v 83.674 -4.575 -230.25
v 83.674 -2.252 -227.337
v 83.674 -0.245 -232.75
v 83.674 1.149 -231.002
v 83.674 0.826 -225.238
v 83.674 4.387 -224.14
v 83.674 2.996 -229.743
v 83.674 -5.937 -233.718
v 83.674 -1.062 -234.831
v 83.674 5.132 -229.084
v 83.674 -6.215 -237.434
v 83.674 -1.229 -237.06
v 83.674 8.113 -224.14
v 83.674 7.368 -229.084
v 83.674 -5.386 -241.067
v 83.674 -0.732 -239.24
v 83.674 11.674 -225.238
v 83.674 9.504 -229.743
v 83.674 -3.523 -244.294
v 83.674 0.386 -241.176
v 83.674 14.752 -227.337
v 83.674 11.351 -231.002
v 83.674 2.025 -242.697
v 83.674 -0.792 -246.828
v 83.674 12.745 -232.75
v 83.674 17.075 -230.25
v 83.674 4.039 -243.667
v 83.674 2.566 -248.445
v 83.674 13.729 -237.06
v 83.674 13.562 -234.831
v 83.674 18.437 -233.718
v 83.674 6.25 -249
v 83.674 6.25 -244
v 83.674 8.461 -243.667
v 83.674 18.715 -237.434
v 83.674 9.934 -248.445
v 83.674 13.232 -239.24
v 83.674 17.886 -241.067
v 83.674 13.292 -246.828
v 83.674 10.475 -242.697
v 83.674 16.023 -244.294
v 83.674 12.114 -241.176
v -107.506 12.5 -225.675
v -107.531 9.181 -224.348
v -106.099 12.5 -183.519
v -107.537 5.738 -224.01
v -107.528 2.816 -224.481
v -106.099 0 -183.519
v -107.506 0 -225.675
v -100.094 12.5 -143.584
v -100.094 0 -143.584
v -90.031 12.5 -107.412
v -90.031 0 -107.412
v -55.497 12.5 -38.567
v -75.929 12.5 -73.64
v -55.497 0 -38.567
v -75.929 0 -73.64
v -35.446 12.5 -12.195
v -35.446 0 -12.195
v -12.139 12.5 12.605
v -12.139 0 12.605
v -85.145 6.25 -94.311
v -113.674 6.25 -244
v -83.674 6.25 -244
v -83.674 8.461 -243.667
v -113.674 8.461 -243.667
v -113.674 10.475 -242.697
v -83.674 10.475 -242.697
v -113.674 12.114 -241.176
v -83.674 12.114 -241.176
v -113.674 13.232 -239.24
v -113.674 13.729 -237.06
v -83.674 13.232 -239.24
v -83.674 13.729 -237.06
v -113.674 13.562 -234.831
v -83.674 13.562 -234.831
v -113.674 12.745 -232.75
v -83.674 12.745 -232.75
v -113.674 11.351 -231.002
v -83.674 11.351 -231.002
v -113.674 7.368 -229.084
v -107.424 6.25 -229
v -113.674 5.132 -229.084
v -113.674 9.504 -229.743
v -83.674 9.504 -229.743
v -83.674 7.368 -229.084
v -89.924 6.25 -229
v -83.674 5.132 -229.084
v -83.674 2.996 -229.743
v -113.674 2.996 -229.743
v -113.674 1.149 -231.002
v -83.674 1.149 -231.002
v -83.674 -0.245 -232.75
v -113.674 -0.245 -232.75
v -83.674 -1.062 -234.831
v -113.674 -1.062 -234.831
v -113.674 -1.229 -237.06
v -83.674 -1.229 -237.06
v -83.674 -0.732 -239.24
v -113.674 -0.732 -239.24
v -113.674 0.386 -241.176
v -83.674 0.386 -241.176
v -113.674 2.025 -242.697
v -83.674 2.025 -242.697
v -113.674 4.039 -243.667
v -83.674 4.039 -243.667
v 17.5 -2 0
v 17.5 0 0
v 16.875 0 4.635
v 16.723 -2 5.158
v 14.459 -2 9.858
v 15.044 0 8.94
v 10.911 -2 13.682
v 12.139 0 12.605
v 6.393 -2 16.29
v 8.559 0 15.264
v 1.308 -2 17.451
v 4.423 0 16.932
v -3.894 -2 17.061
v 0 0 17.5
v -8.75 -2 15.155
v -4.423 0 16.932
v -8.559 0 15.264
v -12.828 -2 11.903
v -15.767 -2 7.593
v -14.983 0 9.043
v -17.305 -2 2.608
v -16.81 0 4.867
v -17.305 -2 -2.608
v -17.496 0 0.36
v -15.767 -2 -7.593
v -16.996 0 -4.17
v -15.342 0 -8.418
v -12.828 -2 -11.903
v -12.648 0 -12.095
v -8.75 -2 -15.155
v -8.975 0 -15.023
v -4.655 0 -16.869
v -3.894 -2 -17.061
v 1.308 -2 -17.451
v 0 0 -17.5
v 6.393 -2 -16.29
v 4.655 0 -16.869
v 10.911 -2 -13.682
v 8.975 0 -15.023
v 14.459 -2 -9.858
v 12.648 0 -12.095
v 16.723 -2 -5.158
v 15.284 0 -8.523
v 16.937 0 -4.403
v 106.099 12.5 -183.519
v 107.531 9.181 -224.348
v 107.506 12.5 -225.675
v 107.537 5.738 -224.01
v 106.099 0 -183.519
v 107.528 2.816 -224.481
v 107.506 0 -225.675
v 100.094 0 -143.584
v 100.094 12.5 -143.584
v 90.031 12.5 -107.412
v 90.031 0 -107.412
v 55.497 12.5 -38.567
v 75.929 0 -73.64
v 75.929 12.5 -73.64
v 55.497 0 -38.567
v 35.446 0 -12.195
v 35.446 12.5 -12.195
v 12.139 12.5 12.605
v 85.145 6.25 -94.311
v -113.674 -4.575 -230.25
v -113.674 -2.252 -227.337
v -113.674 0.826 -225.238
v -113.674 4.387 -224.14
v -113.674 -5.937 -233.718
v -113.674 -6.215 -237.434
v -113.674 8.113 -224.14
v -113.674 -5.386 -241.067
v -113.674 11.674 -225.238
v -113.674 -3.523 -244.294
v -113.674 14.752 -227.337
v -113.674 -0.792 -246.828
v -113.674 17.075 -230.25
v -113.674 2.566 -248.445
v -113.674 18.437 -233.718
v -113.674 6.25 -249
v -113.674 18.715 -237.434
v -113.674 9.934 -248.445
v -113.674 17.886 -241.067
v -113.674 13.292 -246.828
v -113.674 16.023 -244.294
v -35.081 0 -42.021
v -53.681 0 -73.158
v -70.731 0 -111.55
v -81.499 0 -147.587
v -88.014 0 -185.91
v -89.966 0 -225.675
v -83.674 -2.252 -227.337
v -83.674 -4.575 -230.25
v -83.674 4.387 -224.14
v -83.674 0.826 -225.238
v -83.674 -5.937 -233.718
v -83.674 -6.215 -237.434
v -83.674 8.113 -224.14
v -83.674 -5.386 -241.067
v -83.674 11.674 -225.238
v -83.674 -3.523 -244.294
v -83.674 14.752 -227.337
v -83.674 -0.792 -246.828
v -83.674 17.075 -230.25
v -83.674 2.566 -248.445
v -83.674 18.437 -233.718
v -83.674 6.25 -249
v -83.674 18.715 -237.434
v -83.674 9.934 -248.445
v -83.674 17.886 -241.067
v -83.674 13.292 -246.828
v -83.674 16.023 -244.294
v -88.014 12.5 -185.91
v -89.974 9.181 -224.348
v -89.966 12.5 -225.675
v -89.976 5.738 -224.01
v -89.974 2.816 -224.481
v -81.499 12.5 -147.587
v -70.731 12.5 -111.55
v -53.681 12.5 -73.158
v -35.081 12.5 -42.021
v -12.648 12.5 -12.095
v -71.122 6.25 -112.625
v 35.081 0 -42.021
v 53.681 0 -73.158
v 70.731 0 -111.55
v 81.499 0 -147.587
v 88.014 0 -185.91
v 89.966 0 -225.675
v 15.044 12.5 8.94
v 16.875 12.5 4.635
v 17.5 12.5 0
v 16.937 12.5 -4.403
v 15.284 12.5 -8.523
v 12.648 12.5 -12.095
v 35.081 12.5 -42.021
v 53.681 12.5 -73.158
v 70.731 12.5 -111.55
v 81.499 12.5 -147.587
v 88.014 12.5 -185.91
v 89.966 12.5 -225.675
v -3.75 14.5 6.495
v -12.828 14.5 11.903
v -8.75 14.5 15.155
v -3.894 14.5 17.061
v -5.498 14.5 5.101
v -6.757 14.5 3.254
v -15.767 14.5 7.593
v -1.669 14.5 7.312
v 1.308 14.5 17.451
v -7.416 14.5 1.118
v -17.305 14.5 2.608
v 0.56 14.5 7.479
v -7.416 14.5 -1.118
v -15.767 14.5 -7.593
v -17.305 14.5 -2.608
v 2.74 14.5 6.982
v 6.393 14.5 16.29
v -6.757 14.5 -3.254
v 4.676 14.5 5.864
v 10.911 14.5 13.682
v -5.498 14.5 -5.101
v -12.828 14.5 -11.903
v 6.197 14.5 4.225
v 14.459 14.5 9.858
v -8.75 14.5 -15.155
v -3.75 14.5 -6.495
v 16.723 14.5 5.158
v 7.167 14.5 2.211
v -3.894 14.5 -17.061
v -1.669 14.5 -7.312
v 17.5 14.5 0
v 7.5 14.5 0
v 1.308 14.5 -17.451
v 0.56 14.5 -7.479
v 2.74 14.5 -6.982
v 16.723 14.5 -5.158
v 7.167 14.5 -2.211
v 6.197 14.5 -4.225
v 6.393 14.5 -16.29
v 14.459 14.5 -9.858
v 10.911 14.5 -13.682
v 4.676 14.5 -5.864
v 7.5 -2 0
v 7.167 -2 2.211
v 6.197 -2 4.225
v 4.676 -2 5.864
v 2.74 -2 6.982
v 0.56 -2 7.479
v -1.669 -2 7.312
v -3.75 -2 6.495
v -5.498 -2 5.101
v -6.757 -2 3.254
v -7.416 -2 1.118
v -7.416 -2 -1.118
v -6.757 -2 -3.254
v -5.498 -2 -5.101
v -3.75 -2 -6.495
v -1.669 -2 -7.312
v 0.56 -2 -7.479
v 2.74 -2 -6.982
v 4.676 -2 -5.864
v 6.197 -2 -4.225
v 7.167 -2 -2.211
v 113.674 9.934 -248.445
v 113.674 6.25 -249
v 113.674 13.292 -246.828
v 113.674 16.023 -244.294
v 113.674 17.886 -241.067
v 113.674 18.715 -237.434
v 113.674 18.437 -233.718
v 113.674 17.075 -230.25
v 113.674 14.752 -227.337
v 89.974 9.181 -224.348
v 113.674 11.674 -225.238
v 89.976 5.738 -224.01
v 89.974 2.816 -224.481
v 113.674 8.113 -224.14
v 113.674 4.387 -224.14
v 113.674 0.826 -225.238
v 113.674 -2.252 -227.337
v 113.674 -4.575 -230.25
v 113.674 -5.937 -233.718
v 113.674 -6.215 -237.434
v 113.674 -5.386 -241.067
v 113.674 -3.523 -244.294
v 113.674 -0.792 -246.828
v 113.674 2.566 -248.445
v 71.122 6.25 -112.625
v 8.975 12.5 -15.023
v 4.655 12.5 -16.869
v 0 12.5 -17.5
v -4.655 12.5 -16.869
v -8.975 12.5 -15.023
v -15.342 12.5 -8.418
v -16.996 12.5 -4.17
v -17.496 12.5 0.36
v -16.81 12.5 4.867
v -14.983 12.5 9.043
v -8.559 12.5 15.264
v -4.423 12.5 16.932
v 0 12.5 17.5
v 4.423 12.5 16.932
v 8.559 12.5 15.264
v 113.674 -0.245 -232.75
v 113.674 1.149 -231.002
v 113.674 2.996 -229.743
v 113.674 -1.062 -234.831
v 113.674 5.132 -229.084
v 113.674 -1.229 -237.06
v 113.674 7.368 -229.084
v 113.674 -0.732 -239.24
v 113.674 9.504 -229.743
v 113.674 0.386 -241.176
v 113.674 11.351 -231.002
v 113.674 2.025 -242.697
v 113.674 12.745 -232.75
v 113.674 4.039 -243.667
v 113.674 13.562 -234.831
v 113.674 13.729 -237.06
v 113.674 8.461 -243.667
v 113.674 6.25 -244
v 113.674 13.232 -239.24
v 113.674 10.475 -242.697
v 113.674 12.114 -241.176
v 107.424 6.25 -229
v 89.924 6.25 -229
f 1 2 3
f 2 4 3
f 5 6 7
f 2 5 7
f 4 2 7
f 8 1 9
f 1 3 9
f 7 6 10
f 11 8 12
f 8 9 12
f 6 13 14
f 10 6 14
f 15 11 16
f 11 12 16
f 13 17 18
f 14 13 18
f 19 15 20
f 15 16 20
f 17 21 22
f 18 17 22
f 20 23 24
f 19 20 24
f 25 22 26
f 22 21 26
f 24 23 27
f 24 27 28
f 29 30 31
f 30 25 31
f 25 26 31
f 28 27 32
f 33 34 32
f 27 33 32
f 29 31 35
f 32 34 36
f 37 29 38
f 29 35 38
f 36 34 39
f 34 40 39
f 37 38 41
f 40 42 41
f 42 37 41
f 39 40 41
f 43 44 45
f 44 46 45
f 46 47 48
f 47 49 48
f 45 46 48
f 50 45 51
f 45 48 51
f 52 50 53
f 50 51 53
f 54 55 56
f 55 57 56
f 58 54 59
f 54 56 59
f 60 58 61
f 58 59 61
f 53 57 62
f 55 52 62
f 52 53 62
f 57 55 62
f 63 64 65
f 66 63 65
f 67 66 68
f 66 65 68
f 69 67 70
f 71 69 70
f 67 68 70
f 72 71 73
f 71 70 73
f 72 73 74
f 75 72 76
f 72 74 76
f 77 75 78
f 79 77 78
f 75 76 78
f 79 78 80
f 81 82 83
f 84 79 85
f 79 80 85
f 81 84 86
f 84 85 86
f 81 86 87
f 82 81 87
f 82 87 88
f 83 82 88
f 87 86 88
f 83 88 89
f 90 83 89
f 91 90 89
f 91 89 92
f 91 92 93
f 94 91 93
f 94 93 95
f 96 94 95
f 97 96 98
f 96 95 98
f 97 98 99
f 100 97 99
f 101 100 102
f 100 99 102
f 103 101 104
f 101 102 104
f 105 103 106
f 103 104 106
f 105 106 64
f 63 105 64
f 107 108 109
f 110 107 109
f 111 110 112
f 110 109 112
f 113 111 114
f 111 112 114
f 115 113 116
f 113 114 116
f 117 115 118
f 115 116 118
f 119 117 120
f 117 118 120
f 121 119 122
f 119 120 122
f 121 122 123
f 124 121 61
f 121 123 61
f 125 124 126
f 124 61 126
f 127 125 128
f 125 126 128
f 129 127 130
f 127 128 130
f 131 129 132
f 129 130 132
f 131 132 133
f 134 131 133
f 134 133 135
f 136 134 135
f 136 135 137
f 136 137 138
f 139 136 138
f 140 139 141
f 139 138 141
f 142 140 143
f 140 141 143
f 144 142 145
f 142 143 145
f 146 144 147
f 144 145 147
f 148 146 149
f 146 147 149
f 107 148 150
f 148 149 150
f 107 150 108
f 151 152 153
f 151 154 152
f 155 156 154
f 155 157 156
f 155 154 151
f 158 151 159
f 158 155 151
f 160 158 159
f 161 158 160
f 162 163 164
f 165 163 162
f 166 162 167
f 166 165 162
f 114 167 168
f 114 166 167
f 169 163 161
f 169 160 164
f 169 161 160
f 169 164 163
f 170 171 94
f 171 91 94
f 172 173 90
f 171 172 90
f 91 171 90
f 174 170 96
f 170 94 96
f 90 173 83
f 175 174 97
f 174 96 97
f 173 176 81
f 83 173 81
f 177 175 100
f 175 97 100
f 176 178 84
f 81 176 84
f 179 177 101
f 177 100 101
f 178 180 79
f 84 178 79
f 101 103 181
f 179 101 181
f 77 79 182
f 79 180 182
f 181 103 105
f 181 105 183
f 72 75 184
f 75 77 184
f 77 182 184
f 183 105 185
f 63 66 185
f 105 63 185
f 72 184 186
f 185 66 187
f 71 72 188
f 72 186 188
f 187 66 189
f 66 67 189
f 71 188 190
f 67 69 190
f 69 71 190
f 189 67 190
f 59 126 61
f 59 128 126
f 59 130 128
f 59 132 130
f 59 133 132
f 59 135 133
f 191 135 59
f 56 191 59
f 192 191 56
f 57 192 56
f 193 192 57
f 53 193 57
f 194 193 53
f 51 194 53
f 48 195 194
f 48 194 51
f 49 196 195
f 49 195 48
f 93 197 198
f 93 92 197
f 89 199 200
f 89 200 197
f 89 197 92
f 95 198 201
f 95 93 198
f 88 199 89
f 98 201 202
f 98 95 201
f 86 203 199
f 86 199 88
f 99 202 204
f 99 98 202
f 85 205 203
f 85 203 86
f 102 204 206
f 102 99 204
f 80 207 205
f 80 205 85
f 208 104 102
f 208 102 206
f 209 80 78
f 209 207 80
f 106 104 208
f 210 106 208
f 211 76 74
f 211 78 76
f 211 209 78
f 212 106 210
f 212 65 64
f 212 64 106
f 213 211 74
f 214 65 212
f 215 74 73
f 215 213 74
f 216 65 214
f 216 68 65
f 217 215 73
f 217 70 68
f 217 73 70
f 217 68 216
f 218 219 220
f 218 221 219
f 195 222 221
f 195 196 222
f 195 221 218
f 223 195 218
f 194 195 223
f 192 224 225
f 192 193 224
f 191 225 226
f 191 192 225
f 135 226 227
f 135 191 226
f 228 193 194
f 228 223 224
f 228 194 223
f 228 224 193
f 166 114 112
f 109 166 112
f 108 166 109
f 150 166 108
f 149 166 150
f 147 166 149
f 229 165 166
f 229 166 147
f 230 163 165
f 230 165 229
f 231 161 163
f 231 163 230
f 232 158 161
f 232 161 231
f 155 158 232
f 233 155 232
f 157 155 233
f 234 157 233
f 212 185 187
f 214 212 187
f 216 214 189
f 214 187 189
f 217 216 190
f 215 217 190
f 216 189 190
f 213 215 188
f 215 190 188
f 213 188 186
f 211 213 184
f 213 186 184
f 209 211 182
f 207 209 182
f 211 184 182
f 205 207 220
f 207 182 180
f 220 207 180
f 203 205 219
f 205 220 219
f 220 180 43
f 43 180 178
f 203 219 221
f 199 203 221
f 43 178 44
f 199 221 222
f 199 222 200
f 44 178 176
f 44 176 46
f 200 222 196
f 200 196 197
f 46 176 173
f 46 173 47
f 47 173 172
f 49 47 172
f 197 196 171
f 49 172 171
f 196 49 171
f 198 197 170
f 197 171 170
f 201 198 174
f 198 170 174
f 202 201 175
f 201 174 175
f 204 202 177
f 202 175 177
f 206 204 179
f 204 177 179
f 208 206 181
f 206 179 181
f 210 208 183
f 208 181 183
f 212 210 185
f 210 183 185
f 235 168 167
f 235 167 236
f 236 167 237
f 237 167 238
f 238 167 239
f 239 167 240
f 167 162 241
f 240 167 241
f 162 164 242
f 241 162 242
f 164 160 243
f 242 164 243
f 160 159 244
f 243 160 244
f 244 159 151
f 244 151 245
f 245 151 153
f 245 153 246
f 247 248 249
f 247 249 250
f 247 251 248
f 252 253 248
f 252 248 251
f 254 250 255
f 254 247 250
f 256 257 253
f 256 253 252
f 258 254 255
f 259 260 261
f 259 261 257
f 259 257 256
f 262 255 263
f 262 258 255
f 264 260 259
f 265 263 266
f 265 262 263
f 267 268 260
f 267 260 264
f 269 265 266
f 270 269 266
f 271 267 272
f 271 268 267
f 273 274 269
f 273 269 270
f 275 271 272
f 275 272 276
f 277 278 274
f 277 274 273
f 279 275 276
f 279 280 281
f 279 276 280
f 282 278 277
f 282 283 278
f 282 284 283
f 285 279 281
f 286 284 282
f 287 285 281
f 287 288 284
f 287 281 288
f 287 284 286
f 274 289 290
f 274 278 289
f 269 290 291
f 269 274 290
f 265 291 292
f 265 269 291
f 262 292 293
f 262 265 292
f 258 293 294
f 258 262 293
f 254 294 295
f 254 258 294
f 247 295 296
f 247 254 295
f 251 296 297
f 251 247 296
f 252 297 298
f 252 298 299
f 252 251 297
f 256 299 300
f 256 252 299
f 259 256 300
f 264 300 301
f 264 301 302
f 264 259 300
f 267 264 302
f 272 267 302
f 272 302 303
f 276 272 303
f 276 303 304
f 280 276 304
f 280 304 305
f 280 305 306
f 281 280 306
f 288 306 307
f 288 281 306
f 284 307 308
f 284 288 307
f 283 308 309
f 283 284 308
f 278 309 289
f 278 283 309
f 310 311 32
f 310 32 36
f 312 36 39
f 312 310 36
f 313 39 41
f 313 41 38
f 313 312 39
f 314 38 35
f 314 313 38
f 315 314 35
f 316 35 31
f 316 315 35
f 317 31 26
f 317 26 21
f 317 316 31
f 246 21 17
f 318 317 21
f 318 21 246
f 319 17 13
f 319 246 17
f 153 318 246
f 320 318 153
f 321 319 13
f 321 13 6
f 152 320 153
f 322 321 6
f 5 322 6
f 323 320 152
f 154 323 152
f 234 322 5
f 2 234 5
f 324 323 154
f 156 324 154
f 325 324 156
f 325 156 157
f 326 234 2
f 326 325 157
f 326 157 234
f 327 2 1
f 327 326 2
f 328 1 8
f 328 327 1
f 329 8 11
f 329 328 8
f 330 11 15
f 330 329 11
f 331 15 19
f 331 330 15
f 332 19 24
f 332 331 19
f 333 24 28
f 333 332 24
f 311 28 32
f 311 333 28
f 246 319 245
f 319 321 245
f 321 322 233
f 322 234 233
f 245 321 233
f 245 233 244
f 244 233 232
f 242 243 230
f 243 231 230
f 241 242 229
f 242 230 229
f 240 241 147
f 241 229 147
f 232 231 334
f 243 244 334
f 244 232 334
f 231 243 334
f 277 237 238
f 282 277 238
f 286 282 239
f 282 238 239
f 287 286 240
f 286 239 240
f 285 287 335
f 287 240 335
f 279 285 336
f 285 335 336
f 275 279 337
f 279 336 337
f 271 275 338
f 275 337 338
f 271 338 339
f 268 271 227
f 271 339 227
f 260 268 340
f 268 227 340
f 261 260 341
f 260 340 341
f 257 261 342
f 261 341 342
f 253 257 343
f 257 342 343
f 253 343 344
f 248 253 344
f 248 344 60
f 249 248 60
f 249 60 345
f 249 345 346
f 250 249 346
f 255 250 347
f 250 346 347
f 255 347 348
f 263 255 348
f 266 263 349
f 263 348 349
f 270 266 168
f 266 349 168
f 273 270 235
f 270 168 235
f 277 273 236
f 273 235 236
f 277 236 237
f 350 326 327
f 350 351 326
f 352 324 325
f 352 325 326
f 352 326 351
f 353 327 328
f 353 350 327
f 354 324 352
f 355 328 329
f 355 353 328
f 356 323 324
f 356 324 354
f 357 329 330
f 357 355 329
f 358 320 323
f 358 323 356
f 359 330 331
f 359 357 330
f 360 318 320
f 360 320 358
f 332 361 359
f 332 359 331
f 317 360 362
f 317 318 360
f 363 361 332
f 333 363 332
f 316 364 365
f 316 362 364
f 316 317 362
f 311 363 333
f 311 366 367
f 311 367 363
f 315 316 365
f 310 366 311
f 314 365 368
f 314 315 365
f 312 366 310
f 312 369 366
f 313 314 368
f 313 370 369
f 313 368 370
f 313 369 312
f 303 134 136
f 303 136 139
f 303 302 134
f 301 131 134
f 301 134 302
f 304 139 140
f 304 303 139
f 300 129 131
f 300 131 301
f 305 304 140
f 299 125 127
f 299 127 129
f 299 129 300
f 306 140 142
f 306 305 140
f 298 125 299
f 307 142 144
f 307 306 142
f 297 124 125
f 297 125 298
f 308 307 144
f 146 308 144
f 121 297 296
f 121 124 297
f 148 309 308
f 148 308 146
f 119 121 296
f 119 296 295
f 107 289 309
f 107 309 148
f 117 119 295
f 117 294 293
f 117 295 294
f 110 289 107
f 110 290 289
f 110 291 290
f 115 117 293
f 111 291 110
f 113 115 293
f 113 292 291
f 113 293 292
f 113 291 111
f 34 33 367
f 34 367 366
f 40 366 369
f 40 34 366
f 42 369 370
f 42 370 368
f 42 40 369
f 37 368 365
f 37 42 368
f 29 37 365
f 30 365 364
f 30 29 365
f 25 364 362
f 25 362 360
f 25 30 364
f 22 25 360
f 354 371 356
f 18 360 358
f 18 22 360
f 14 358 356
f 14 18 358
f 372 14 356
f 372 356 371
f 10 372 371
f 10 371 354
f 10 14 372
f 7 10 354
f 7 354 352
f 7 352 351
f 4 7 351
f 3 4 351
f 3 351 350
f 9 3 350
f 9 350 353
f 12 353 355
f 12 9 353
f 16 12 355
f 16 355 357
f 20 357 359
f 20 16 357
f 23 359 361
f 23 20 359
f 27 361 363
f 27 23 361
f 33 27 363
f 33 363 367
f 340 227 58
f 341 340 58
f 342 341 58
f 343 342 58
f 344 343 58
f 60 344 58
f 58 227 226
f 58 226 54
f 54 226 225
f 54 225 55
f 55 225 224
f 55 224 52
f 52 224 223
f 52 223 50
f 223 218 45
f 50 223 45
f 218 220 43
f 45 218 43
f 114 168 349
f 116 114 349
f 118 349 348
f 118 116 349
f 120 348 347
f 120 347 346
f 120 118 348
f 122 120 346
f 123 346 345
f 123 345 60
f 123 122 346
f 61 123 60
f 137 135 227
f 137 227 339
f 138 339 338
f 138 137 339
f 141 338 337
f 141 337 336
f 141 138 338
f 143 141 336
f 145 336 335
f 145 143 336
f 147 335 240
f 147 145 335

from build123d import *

# Parameters (mm, degrees)
CROQUIS1_R              = 7.5
SALIENTE_EXTRUIR1_DEPTH = 12.5
CROQUIS3_R              = 12.5
CROQUIS3_R_2            = 7.5
SALIENTE_EXTRUIR2_DEPTH = 15
CROQUIS4_R              = 17.5
CROQUIS4_R_2            = 7.5
SALIENTE_EXTRUIR3_DEPTH = 2
CROQUIS5_R              = 17.5
CROQUIS5_R_2            = 7.5
SALIENTE_EXTRUIR4_DEPTH = 2


with BuildPart() as part:
    # Croquis1 → Saliente-Extruir1 (new body)
    with BuildSketch(Plane(origin=(0, 0, 0), x_dir=(1, 0, 0), z_dir=(0, 1, 0))):
        with BuildLine():
            Line((-107.423550962, 229), (-89.923550962, 229))
            add(Edge.make_bspline(
                [(-89.923550962, 229), (-92.027233401, 107.676295976), (-12.647886898, 12.09466647)],
                knots=[0, 0, 0, 1, 1, 1], degree=2))
            ThreePointArc((-12.647886898, 12.09466647), (0, 17.5), (12.647886898, 12.09466647))
            add(Edge.make_bspline(
                [(89.923550962, 229), (92.027233401, 107.676295976), (12.647886898, 12.09466647)],
                knots=[0, 0, 0, 1, 1, 1], degree=2))
            Line((89.923550962, 229), (107.423550962, 229))
            add(Edge.make_bspline(
                [(107.423550962, 229), (111.604135582, 83.182199319), (12.139143835, -12.605204756)],
                knots=[0, 0, 0, 1, 1, 1], degree=2))
            ThreePointArc((12.139143835, -12.605204756), (0, -17.5), (-12.139143835, -12.605204756))
            add(Edge.make_bspline(
                [(-107.423550962, 229), (-111.604135582, 83.182199319), (-12.139143835, -12.605204756)],
                knots=[0, 0, 0, 1, 1, 1], degree=2))
        make_face()
        Circle(CROQUIS1_R, mode=Mode.SUBTRACT)
    extrude(amount=SALIENTE_EXTRUIR1_DEPTH)

    # Croquis3 → Saliente-Extruir2 (add, symmetric)
    with BuildSketch(Plane(origin=(98.673550962, 0, 0), x_dir=(0, 0, -1), z_dir=(1, 0, 0))):
        with Locations((236.5, 6.25)):
            Circle(CROQUIS3_R)
        with Locations((236.5, 6.25)):
            Circle(CROQUIS3_R_2, mode=Mode.SUBTRACT)
    saliente_extruir2 = extrude(amount=SALIENTE_EXTRUIR2_DEPTH, both=True)

    # Simetría1: Saliente-Extruir2 across plane
    add(saliente_extruir2.mirror(Plane(origin=(0, 0, 0), x_dir=(0, 0, 1), z_dir=(1, 0, 0))))

    # Croquis4 → Saliente-Extruir3 (add)
    with BuildSketch(Plane(origin=(0, 12.5, 0), x_dir=(1, 0, 0), z_dir=(0, 1, 0))):
        Circle(CROQUIS4_R)
        Circle(CROQUIS4_R_2, mode=Mode.SUBTRACT)
    extrude(amount=SALIENTE_EXTRUIR3_DEPTH)

    # Croquis5 → Saliente-Extruir4 (add)
    with BuildSketch(Plane.XZ):
        Circle(CROQUIS5_R)
        Circle(CROQUIS5_R_2, mode=Mode.SUBTRACT)
    extrude(amount=SALIENTE_EXTRUIR4_DEPTH)


solid = part.part
